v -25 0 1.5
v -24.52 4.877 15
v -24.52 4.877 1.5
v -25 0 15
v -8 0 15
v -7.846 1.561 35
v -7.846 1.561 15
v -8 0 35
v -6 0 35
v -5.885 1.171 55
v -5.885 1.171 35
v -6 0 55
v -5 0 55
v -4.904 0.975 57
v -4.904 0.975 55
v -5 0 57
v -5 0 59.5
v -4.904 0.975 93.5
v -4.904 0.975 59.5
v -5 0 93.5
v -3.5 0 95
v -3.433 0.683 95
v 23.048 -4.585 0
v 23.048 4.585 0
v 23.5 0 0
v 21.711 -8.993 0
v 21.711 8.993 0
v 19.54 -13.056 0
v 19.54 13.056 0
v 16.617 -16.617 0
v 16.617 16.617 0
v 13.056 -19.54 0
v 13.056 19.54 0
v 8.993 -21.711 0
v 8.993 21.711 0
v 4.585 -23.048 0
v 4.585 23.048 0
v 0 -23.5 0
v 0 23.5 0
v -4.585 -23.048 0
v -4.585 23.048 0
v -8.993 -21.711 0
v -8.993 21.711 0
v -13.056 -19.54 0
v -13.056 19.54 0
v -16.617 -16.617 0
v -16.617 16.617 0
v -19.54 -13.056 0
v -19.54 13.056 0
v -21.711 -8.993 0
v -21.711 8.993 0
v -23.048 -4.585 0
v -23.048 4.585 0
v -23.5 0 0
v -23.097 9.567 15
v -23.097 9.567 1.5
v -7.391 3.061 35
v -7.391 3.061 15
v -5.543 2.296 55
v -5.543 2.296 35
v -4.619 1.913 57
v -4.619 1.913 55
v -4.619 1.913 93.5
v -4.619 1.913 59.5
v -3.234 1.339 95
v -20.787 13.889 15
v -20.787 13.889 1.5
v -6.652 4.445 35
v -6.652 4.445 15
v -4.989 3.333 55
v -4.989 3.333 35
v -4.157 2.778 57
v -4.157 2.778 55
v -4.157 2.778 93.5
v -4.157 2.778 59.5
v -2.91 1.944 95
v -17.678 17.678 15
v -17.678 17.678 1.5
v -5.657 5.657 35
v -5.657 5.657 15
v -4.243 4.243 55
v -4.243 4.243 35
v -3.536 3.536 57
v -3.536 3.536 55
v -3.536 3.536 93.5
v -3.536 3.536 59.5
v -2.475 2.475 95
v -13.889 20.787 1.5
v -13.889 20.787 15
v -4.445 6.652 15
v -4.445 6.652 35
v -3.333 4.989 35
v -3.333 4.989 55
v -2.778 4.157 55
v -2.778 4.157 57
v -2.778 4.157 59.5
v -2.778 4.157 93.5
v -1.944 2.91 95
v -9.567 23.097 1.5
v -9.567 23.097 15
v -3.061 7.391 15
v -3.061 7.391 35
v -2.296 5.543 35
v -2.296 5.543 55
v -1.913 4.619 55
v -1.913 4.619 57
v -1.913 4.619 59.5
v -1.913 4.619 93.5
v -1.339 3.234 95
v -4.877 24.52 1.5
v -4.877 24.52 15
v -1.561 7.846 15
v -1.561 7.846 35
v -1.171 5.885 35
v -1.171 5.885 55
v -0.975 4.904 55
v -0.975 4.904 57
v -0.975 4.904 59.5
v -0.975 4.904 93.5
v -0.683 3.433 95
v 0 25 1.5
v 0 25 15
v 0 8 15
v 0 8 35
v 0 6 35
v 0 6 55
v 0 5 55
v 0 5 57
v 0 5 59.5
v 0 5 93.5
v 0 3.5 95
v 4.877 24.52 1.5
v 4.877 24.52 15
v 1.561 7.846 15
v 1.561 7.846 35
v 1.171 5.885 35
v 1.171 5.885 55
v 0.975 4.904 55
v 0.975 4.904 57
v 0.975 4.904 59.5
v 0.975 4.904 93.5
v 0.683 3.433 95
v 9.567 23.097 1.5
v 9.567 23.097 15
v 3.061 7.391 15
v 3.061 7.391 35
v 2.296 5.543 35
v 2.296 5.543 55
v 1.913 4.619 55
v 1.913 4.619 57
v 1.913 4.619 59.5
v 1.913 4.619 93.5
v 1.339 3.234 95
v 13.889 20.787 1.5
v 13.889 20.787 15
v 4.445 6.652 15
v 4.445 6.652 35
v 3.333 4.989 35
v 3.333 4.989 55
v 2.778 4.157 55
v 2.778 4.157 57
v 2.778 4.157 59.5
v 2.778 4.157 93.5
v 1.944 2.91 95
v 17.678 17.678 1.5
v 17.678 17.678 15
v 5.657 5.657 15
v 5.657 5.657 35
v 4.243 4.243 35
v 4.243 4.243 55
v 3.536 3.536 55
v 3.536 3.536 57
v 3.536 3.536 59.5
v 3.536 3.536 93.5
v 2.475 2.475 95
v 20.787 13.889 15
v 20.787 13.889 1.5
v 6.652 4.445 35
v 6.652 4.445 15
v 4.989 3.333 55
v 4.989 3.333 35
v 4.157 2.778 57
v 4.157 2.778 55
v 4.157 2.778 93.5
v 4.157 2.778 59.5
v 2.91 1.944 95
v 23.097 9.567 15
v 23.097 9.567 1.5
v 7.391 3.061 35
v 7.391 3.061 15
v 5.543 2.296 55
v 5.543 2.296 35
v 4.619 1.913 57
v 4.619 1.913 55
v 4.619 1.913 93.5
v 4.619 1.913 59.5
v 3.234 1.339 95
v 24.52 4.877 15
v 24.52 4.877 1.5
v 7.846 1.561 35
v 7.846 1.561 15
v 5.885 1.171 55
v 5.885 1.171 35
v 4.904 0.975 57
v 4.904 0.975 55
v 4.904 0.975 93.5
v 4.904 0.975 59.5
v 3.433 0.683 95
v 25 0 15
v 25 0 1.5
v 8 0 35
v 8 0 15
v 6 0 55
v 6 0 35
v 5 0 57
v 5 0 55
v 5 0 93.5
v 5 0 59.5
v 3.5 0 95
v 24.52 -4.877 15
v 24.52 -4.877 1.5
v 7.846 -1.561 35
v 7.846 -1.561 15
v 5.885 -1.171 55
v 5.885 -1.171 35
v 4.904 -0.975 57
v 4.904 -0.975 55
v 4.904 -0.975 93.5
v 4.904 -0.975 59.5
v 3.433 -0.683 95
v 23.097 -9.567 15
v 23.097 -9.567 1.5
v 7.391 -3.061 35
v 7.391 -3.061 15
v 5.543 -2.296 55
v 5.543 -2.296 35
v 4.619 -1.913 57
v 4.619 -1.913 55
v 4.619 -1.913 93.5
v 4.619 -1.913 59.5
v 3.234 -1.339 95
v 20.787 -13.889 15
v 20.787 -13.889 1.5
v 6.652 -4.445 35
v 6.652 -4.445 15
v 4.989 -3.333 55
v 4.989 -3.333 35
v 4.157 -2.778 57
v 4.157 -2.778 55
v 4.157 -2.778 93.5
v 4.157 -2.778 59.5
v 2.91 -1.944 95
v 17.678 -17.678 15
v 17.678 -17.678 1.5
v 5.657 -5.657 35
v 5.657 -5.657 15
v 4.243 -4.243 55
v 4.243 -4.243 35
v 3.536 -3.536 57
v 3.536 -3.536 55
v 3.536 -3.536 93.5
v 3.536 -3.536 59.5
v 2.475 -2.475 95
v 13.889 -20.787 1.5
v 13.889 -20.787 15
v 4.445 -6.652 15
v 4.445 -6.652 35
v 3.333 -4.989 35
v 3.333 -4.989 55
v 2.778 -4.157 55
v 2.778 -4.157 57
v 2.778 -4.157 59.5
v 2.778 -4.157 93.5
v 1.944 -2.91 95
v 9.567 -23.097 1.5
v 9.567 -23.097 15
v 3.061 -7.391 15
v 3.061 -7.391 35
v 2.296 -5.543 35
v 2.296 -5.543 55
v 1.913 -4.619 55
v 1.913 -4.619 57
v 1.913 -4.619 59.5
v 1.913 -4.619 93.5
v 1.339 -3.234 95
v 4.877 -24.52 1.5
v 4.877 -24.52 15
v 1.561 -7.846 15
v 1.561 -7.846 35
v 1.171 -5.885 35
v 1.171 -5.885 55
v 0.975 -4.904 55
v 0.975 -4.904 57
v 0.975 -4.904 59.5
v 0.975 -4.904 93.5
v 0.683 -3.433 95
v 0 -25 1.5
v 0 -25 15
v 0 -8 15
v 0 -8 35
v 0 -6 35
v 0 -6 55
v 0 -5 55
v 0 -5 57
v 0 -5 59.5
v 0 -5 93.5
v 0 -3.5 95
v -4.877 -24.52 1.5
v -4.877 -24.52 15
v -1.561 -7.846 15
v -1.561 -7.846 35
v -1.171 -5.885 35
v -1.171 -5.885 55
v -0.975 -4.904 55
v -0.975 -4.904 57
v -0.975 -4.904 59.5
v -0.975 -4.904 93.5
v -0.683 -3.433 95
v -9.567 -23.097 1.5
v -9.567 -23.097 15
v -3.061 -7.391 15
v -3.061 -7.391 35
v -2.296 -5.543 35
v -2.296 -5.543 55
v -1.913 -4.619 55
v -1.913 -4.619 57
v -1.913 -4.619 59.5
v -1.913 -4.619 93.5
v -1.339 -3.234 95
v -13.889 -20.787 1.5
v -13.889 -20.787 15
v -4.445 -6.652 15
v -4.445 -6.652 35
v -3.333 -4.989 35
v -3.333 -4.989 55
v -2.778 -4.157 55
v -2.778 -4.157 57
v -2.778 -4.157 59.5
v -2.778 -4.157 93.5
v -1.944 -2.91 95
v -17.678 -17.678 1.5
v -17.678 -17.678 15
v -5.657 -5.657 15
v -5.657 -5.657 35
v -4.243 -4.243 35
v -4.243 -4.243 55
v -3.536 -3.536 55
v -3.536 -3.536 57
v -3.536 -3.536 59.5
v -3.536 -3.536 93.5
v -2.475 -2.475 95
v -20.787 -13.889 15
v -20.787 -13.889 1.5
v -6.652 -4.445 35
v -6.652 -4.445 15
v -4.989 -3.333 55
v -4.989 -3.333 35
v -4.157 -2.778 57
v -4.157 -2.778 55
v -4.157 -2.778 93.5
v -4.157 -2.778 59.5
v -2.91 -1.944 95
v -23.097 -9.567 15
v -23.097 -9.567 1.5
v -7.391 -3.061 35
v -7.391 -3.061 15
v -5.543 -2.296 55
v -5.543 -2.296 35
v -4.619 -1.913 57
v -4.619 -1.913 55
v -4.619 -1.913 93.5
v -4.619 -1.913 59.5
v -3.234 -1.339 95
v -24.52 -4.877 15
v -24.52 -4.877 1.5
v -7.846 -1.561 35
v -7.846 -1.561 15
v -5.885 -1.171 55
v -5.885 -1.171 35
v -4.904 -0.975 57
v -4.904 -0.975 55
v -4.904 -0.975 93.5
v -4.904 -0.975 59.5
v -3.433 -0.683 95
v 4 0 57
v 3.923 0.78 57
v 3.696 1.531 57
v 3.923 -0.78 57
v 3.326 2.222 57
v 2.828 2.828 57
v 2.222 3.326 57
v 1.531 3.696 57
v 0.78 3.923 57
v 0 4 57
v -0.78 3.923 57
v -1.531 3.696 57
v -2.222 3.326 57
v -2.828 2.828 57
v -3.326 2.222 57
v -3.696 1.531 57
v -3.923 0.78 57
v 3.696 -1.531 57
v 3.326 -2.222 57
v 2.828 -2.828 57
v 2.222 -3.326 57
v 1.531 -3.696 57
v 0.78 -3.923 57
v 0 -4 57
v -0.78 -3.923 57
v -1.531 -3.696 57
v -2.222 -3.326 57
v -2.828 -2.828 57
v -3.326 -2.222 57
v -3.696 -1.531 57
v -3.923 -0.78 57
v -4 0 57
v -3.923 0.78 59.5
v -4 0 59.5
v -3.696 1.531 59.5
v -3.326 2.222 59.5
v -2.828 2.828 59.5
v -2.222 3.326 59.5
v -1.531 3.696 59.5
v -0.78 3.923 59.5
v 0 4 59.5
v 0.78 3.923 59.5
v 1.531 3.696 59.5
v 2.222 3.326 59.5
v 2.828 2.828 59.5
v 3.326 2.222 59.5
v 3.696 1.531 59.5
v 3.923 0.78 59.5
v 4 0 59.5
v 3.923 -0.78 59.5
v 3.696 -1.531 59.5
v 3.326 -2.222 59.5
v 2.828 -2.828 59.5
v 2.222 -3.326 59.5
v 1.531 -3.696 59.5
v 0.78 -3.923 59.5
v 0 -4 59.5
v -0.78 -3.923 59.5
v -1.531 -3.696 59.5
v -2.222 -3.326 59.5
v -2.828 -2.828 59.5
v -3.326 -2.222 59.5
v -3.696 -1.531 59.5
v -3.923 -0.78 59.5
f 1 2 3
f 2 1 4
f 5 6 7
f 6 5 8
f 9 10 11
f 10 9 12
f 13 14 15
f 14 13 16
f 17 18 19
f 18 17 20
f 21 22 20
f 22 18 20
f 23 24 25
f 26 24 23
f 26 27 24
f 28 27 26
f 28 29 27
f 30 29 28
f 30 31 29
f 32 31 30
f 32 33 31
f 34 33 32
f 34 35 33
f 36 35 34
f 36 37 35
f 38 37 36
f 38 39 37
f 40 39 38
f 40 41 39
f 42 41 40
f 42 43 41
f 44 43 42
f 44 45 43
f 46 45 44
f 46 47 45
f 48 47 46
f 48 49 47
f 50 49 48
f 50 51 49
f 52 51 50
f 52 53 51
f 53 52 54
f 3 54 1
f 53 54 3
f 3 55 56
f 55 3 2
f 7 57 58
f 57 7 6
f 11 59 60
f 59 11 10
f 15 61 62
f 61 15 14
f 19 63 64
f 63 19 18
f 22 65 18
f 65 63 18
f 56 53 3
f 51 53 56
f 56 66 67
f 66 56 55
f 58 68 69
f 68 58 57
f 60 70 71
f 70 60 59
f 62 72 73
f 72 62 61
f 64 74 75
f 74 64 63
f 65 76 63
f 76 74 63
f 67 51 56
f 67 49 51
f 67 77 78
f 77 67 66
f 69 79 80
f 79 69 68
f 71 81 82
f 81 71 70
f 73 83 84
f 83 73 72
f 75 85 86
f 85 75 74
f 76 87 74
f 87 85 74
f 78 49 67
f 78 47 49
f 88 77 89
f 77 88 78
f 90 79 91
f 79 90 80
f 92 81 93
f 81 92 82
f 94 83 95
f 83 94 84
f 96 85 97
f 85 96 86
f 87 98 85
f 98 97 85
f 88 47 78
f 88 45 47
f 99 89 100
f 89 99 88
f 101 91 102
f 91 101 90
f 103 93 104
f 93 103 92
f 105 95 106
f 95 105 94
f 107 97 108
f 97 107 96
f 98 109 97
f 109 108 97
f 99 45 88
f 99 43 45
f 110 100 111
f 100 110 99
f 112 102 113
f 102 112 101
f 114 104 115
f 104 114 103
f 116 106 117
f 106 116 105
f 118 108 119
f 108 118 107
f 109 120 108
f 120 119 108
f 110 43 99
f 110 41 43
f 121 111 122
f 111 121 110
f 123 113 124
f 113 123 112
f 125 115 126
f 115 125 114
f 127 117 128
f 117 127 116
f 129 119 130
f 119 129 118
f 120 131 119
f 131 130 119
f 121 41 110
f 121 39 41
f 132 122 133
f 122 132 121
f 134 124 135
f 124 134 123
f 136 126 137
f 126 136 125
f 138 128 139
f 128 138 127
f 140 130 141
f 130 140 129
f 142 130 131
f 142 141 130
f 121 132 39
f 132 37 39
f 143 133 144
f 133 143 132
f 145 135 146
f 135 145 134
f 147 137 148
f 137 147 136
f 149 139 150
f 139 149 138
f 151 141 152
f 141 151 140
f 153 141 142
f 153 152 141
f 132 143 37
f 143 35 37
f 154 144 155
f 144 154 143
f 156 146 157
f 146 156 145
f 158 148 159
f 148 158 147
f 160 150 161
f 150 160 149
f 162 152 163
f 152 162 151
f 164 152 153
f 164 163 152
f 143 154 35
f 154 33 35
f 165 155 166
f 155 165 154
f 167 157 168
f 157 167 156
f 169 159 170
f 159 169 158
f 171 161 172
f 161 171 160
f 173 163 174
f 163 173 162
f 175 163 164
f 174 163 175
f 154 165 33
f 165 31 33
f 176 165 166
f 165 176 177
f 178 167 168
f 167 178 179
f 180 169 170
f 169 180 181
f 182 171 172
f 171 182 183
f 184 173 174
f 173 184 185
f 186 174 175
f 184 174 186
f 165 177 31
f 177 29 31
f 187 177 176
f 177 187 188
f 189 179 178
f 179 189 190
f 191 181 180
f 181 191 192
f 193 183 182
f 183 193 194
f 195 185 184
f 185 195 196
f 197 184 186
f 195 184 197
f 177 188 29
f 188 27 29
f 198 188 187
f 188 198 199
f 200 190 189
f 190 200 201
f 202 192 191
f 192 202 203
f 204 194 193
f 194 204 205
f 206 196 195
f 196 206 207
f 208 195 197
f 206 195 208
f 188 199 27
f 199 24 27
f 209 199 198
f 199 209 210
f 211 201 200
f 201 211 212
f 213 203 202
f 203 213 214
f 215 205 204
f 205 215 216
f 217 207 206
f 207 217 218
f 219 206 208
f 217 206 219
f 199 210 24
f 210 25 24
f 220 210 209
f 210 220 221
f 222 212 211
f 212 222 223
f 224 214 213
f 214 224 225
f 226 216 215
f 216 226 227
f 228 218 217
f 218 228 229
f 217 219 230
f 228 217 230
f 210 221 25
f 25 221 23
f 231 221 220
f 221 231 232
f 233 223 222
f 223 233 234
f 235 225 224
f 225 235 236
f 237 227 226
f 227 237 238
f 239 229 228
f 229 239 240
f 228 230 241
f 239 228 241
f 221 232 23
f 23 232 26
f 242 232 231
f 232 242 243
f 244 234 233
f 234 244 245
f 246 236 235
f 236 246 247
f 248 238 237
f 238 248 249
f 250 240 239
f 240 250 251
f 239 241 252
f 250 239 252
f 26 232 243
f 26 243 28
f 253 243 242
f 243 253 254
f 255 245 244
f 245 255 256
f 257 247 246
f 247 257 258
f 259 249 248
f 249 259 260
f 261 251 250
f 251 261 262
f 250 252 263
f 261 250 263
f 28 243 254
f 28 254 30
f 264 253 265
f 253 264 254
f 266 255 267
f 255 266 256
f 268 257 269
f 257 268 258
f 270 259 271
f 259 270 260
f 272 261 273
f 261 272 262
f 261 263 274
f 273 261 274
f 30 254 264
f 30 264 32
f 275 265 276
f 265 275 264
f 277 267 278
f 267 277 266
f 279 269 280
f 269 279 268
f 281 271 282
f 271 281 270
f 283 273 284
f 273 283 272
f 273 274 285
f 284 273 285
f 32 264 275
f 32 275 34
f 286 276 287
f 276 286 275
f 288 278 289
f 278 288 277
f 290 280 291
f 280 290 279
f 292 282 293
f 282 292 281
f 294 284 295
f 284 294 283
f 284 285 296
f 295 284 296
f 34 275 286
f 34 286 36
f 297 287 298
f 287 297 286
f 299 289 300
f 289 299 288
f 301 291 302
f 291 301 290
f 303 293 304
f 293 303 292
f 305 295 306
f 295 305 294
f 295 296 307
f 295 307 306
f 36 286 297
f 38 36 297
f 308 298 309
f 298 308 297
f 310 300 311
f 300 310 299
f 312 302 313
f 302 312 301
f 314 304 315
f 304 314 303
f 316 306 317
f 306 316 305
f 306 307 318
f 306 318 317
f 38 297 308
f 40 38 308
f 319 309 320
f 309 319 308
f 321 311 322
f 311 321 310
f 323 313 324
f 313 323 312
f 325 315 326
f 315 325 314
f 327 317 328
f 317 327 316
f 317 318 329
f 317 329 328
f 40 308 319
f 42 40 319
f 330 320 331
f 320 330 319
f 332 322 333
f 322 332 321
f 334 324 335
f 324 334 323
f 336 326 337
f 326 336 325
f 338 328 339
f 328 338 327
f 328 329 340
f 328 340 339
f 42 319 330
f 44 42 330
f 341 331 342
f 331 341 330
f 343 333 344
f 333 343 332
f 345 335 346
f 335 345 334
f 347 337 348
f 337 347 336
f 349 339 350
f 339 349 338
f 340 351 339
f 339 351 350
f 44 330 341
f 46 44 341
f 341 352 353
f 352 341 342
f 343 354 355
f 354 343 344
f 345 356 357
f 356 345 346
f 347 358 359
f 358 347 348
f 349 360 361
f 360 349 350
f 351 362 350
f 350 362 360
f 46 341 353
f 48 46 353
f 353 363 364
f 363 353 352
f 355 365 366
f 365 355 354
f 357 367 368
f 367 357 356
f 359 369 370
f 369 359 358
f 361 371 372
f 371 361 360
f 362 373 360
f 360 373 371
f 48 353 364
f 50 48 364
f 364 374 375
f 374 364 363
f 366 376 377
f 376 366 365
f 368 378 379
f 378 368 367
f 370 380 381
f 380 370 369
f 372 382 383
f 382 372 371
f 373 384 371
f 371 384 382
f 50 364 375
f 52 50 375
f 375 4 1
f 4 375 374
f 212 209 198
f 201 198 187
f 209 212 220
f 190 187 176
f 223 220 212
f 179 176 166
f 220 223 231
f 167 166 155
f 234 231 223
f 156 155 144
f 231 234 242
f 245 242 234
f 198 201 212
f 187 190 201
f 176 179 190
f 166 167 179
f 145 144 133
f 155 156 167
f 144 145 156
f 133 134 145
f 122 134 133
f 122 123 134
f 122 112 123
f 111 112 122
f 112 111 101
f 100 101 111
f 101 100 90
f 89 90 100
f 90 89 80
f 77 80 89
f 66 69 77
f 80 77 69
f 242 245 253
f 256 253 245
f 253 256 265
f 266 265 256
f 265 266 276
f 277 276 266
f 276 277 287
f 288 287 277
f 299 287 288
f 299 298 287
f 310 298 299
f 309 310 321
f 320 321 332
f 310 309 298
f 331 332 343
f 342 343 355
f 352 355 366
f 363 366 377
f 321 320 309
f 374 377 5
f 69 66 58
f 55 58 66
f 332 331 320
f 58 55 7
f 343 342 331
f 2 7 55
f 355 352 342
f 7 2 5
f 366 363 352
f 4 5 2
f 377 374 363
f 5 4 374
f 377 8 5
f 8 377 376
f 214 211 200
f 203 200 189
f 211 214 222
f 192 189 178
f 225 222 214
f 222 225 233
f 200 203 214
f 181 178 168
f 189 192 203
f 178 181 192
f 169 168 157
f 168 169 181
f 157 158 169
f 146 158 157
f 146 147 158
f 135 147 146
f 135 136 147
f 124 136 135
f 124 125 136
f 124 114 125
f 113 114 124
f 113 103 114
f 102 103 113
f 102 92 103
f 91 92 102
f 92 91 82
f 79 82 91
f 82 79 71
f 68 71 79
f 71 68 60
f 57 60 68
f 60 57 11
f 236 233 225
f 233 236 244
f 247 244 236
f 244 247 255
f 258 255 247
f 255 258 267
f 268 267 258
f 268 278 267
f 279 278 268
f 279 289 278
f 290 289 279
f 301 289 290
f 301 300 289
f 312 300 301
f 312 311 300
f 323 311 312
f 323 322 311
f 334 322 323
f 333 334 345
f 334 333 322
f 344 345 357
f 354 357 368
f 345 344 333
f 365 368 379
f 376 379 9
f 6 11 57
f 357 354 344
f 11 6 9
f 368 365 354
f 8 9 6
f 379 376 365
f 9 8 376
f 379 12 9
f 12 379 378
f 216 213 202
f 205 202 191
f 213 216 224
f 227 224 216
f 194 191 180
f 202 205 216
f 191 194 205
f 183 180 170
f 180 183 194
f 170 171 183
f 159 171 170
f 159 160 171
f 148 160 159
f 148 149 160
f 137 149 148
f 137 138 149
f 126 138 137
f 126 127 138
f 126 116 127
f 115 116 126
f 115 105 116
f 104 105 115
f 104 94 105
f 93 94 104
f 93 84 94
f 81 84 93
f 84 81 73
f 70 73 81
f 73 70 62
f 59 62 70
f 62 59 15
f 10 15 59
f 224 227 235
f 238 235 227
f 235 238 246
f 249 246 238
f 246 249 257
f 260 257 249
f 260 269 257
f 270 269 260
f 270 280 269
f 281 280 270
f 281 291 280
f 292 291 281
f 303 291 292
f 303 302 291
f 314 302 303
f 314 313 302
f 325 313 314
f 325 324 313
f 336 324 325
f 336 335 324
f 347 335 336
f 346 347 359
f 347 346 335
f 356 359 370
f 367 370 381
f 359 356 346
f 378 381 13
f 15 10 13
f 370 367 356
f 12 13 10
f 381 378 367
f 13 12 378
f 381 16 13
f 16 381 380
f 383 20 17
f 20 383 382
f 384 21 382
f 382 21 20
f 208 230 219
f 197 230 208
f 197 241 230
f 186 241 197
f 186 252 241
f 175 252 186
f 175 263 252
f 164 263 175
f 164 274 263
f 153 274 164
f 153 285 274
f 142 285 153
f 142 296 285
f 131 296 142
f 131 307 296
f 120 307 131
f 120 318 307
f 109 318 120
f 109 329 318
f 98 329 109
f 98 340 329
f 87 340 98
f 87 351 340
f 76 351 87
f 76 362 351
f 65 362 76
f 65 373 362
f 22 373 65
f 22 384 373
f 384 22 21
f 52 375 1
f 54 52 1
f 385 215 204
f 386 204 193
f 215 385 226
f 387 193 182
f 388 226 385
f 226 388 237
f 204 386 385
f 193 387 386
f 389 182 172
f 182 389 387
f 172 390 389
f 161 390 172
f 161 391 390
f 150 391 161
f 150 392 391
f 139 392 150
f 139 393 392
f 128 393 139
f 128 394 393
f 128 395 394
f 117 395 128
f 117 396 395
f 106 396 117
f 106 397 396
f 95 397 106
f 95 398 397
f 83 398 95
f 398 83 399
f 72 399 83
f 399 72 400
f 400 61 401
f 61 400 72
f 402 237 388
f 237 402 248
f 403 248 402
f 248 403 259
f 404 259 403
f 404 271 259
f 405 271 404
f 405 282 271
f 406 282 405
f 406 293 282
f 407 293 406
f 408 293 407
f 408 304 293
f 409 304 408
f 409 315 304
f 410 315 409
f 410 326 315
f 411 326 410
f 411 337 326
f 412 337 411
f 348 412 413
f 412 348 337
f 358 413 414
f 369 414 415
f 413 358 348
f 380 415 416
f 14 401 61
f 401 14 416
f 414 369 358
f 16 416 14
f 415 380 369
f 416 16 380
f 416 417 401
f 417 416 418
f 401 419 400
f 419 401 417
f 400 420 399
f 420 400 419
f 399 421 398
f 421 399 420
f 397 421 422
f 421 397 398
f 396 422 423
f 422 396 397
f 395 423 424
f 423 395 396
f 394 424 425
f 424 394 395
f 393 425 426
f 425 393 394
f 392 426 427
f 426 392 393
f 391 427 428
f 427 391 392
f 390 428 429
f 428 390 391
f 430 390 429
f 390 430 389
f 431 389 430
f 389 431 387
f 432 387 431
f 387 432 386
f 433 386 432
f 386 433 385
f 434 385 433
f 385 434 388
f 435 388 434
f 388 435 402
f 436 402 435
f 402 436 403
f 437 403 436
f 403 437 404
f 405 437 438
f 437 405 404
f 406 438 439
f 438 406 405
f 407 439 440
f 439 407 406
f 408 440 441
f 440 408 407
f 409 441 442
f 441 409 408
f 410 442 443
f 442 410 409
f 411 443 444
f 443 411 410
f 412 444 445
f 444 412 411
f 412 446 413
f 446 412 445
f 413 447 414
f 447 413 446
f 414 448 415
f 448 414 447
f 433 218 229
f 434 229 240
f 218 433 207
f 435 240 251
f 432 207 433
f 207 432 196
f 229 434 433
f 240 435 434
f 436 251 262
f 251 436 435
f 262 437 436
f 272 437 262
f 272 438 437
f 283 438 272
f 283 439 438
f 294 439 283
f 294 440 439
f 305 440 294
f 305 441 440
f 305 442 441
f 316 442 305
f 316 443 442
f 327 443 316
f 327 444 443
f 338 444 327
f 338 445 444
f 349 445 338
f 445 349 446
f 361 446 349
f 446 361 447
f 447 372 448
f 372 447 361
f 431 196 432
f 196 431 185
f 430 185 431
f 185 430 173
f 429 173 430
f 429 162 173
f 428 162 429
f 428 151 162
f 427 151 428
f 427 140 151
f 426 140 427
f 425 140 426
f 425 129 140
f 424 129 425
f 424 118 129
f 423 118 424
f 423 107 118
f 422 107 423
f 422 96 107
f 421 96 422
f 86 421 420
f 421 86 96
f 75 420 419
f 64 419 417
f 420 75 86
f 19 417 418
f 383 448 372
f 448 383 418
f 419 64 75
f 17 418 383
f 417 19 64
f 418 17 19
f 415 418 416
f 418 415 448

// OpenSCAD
$fn = 32;

// ----------------------------------------------------------------------
// Stepped shaft: diameters 50, 16, 12, 10 mm, 95 mm long
// ----------------------------------------------------------------------

// --- parameters (mm) ---
d1 = 50;                  // step 1 diameter
len1 = 15;                // step 1 length
d2 = 16;                  // step 2 diameter
len2 = 20;                // step 2 length
d3 = 12;                  // step 3 diameter
len3 = 20;                // step 3 length
d4 = 10;                  // step 4 diameter
len4 = 40;                // step 4 length
total = 95;               // overall length
chamfer = 1.5;            // end chamfer
groove_r = 5;             // groove radius
groove_z = 57;            // groove position from the end
groove_w = 2.5;           // groove width
groove_d = 1;             // groove depth

/* closed turning profile: x is the radius, y is the length */
profile = [[0, 0], [25 - chamfer, 0], [25, chamfer], [25, 15], [8, 15], [8, 35], [6, 35], [6, 55], [5, 55], [5, 93.5], [3.5, 95], [0, 95]];

difference() {
  rotate_extrude() polygon(profile);
  /* circlip groove just behind the shoulder */
  rotate_extrude() translate([groove_r - groove_d, groove_z]) square([groove_d + 1, groove_w]);
}
